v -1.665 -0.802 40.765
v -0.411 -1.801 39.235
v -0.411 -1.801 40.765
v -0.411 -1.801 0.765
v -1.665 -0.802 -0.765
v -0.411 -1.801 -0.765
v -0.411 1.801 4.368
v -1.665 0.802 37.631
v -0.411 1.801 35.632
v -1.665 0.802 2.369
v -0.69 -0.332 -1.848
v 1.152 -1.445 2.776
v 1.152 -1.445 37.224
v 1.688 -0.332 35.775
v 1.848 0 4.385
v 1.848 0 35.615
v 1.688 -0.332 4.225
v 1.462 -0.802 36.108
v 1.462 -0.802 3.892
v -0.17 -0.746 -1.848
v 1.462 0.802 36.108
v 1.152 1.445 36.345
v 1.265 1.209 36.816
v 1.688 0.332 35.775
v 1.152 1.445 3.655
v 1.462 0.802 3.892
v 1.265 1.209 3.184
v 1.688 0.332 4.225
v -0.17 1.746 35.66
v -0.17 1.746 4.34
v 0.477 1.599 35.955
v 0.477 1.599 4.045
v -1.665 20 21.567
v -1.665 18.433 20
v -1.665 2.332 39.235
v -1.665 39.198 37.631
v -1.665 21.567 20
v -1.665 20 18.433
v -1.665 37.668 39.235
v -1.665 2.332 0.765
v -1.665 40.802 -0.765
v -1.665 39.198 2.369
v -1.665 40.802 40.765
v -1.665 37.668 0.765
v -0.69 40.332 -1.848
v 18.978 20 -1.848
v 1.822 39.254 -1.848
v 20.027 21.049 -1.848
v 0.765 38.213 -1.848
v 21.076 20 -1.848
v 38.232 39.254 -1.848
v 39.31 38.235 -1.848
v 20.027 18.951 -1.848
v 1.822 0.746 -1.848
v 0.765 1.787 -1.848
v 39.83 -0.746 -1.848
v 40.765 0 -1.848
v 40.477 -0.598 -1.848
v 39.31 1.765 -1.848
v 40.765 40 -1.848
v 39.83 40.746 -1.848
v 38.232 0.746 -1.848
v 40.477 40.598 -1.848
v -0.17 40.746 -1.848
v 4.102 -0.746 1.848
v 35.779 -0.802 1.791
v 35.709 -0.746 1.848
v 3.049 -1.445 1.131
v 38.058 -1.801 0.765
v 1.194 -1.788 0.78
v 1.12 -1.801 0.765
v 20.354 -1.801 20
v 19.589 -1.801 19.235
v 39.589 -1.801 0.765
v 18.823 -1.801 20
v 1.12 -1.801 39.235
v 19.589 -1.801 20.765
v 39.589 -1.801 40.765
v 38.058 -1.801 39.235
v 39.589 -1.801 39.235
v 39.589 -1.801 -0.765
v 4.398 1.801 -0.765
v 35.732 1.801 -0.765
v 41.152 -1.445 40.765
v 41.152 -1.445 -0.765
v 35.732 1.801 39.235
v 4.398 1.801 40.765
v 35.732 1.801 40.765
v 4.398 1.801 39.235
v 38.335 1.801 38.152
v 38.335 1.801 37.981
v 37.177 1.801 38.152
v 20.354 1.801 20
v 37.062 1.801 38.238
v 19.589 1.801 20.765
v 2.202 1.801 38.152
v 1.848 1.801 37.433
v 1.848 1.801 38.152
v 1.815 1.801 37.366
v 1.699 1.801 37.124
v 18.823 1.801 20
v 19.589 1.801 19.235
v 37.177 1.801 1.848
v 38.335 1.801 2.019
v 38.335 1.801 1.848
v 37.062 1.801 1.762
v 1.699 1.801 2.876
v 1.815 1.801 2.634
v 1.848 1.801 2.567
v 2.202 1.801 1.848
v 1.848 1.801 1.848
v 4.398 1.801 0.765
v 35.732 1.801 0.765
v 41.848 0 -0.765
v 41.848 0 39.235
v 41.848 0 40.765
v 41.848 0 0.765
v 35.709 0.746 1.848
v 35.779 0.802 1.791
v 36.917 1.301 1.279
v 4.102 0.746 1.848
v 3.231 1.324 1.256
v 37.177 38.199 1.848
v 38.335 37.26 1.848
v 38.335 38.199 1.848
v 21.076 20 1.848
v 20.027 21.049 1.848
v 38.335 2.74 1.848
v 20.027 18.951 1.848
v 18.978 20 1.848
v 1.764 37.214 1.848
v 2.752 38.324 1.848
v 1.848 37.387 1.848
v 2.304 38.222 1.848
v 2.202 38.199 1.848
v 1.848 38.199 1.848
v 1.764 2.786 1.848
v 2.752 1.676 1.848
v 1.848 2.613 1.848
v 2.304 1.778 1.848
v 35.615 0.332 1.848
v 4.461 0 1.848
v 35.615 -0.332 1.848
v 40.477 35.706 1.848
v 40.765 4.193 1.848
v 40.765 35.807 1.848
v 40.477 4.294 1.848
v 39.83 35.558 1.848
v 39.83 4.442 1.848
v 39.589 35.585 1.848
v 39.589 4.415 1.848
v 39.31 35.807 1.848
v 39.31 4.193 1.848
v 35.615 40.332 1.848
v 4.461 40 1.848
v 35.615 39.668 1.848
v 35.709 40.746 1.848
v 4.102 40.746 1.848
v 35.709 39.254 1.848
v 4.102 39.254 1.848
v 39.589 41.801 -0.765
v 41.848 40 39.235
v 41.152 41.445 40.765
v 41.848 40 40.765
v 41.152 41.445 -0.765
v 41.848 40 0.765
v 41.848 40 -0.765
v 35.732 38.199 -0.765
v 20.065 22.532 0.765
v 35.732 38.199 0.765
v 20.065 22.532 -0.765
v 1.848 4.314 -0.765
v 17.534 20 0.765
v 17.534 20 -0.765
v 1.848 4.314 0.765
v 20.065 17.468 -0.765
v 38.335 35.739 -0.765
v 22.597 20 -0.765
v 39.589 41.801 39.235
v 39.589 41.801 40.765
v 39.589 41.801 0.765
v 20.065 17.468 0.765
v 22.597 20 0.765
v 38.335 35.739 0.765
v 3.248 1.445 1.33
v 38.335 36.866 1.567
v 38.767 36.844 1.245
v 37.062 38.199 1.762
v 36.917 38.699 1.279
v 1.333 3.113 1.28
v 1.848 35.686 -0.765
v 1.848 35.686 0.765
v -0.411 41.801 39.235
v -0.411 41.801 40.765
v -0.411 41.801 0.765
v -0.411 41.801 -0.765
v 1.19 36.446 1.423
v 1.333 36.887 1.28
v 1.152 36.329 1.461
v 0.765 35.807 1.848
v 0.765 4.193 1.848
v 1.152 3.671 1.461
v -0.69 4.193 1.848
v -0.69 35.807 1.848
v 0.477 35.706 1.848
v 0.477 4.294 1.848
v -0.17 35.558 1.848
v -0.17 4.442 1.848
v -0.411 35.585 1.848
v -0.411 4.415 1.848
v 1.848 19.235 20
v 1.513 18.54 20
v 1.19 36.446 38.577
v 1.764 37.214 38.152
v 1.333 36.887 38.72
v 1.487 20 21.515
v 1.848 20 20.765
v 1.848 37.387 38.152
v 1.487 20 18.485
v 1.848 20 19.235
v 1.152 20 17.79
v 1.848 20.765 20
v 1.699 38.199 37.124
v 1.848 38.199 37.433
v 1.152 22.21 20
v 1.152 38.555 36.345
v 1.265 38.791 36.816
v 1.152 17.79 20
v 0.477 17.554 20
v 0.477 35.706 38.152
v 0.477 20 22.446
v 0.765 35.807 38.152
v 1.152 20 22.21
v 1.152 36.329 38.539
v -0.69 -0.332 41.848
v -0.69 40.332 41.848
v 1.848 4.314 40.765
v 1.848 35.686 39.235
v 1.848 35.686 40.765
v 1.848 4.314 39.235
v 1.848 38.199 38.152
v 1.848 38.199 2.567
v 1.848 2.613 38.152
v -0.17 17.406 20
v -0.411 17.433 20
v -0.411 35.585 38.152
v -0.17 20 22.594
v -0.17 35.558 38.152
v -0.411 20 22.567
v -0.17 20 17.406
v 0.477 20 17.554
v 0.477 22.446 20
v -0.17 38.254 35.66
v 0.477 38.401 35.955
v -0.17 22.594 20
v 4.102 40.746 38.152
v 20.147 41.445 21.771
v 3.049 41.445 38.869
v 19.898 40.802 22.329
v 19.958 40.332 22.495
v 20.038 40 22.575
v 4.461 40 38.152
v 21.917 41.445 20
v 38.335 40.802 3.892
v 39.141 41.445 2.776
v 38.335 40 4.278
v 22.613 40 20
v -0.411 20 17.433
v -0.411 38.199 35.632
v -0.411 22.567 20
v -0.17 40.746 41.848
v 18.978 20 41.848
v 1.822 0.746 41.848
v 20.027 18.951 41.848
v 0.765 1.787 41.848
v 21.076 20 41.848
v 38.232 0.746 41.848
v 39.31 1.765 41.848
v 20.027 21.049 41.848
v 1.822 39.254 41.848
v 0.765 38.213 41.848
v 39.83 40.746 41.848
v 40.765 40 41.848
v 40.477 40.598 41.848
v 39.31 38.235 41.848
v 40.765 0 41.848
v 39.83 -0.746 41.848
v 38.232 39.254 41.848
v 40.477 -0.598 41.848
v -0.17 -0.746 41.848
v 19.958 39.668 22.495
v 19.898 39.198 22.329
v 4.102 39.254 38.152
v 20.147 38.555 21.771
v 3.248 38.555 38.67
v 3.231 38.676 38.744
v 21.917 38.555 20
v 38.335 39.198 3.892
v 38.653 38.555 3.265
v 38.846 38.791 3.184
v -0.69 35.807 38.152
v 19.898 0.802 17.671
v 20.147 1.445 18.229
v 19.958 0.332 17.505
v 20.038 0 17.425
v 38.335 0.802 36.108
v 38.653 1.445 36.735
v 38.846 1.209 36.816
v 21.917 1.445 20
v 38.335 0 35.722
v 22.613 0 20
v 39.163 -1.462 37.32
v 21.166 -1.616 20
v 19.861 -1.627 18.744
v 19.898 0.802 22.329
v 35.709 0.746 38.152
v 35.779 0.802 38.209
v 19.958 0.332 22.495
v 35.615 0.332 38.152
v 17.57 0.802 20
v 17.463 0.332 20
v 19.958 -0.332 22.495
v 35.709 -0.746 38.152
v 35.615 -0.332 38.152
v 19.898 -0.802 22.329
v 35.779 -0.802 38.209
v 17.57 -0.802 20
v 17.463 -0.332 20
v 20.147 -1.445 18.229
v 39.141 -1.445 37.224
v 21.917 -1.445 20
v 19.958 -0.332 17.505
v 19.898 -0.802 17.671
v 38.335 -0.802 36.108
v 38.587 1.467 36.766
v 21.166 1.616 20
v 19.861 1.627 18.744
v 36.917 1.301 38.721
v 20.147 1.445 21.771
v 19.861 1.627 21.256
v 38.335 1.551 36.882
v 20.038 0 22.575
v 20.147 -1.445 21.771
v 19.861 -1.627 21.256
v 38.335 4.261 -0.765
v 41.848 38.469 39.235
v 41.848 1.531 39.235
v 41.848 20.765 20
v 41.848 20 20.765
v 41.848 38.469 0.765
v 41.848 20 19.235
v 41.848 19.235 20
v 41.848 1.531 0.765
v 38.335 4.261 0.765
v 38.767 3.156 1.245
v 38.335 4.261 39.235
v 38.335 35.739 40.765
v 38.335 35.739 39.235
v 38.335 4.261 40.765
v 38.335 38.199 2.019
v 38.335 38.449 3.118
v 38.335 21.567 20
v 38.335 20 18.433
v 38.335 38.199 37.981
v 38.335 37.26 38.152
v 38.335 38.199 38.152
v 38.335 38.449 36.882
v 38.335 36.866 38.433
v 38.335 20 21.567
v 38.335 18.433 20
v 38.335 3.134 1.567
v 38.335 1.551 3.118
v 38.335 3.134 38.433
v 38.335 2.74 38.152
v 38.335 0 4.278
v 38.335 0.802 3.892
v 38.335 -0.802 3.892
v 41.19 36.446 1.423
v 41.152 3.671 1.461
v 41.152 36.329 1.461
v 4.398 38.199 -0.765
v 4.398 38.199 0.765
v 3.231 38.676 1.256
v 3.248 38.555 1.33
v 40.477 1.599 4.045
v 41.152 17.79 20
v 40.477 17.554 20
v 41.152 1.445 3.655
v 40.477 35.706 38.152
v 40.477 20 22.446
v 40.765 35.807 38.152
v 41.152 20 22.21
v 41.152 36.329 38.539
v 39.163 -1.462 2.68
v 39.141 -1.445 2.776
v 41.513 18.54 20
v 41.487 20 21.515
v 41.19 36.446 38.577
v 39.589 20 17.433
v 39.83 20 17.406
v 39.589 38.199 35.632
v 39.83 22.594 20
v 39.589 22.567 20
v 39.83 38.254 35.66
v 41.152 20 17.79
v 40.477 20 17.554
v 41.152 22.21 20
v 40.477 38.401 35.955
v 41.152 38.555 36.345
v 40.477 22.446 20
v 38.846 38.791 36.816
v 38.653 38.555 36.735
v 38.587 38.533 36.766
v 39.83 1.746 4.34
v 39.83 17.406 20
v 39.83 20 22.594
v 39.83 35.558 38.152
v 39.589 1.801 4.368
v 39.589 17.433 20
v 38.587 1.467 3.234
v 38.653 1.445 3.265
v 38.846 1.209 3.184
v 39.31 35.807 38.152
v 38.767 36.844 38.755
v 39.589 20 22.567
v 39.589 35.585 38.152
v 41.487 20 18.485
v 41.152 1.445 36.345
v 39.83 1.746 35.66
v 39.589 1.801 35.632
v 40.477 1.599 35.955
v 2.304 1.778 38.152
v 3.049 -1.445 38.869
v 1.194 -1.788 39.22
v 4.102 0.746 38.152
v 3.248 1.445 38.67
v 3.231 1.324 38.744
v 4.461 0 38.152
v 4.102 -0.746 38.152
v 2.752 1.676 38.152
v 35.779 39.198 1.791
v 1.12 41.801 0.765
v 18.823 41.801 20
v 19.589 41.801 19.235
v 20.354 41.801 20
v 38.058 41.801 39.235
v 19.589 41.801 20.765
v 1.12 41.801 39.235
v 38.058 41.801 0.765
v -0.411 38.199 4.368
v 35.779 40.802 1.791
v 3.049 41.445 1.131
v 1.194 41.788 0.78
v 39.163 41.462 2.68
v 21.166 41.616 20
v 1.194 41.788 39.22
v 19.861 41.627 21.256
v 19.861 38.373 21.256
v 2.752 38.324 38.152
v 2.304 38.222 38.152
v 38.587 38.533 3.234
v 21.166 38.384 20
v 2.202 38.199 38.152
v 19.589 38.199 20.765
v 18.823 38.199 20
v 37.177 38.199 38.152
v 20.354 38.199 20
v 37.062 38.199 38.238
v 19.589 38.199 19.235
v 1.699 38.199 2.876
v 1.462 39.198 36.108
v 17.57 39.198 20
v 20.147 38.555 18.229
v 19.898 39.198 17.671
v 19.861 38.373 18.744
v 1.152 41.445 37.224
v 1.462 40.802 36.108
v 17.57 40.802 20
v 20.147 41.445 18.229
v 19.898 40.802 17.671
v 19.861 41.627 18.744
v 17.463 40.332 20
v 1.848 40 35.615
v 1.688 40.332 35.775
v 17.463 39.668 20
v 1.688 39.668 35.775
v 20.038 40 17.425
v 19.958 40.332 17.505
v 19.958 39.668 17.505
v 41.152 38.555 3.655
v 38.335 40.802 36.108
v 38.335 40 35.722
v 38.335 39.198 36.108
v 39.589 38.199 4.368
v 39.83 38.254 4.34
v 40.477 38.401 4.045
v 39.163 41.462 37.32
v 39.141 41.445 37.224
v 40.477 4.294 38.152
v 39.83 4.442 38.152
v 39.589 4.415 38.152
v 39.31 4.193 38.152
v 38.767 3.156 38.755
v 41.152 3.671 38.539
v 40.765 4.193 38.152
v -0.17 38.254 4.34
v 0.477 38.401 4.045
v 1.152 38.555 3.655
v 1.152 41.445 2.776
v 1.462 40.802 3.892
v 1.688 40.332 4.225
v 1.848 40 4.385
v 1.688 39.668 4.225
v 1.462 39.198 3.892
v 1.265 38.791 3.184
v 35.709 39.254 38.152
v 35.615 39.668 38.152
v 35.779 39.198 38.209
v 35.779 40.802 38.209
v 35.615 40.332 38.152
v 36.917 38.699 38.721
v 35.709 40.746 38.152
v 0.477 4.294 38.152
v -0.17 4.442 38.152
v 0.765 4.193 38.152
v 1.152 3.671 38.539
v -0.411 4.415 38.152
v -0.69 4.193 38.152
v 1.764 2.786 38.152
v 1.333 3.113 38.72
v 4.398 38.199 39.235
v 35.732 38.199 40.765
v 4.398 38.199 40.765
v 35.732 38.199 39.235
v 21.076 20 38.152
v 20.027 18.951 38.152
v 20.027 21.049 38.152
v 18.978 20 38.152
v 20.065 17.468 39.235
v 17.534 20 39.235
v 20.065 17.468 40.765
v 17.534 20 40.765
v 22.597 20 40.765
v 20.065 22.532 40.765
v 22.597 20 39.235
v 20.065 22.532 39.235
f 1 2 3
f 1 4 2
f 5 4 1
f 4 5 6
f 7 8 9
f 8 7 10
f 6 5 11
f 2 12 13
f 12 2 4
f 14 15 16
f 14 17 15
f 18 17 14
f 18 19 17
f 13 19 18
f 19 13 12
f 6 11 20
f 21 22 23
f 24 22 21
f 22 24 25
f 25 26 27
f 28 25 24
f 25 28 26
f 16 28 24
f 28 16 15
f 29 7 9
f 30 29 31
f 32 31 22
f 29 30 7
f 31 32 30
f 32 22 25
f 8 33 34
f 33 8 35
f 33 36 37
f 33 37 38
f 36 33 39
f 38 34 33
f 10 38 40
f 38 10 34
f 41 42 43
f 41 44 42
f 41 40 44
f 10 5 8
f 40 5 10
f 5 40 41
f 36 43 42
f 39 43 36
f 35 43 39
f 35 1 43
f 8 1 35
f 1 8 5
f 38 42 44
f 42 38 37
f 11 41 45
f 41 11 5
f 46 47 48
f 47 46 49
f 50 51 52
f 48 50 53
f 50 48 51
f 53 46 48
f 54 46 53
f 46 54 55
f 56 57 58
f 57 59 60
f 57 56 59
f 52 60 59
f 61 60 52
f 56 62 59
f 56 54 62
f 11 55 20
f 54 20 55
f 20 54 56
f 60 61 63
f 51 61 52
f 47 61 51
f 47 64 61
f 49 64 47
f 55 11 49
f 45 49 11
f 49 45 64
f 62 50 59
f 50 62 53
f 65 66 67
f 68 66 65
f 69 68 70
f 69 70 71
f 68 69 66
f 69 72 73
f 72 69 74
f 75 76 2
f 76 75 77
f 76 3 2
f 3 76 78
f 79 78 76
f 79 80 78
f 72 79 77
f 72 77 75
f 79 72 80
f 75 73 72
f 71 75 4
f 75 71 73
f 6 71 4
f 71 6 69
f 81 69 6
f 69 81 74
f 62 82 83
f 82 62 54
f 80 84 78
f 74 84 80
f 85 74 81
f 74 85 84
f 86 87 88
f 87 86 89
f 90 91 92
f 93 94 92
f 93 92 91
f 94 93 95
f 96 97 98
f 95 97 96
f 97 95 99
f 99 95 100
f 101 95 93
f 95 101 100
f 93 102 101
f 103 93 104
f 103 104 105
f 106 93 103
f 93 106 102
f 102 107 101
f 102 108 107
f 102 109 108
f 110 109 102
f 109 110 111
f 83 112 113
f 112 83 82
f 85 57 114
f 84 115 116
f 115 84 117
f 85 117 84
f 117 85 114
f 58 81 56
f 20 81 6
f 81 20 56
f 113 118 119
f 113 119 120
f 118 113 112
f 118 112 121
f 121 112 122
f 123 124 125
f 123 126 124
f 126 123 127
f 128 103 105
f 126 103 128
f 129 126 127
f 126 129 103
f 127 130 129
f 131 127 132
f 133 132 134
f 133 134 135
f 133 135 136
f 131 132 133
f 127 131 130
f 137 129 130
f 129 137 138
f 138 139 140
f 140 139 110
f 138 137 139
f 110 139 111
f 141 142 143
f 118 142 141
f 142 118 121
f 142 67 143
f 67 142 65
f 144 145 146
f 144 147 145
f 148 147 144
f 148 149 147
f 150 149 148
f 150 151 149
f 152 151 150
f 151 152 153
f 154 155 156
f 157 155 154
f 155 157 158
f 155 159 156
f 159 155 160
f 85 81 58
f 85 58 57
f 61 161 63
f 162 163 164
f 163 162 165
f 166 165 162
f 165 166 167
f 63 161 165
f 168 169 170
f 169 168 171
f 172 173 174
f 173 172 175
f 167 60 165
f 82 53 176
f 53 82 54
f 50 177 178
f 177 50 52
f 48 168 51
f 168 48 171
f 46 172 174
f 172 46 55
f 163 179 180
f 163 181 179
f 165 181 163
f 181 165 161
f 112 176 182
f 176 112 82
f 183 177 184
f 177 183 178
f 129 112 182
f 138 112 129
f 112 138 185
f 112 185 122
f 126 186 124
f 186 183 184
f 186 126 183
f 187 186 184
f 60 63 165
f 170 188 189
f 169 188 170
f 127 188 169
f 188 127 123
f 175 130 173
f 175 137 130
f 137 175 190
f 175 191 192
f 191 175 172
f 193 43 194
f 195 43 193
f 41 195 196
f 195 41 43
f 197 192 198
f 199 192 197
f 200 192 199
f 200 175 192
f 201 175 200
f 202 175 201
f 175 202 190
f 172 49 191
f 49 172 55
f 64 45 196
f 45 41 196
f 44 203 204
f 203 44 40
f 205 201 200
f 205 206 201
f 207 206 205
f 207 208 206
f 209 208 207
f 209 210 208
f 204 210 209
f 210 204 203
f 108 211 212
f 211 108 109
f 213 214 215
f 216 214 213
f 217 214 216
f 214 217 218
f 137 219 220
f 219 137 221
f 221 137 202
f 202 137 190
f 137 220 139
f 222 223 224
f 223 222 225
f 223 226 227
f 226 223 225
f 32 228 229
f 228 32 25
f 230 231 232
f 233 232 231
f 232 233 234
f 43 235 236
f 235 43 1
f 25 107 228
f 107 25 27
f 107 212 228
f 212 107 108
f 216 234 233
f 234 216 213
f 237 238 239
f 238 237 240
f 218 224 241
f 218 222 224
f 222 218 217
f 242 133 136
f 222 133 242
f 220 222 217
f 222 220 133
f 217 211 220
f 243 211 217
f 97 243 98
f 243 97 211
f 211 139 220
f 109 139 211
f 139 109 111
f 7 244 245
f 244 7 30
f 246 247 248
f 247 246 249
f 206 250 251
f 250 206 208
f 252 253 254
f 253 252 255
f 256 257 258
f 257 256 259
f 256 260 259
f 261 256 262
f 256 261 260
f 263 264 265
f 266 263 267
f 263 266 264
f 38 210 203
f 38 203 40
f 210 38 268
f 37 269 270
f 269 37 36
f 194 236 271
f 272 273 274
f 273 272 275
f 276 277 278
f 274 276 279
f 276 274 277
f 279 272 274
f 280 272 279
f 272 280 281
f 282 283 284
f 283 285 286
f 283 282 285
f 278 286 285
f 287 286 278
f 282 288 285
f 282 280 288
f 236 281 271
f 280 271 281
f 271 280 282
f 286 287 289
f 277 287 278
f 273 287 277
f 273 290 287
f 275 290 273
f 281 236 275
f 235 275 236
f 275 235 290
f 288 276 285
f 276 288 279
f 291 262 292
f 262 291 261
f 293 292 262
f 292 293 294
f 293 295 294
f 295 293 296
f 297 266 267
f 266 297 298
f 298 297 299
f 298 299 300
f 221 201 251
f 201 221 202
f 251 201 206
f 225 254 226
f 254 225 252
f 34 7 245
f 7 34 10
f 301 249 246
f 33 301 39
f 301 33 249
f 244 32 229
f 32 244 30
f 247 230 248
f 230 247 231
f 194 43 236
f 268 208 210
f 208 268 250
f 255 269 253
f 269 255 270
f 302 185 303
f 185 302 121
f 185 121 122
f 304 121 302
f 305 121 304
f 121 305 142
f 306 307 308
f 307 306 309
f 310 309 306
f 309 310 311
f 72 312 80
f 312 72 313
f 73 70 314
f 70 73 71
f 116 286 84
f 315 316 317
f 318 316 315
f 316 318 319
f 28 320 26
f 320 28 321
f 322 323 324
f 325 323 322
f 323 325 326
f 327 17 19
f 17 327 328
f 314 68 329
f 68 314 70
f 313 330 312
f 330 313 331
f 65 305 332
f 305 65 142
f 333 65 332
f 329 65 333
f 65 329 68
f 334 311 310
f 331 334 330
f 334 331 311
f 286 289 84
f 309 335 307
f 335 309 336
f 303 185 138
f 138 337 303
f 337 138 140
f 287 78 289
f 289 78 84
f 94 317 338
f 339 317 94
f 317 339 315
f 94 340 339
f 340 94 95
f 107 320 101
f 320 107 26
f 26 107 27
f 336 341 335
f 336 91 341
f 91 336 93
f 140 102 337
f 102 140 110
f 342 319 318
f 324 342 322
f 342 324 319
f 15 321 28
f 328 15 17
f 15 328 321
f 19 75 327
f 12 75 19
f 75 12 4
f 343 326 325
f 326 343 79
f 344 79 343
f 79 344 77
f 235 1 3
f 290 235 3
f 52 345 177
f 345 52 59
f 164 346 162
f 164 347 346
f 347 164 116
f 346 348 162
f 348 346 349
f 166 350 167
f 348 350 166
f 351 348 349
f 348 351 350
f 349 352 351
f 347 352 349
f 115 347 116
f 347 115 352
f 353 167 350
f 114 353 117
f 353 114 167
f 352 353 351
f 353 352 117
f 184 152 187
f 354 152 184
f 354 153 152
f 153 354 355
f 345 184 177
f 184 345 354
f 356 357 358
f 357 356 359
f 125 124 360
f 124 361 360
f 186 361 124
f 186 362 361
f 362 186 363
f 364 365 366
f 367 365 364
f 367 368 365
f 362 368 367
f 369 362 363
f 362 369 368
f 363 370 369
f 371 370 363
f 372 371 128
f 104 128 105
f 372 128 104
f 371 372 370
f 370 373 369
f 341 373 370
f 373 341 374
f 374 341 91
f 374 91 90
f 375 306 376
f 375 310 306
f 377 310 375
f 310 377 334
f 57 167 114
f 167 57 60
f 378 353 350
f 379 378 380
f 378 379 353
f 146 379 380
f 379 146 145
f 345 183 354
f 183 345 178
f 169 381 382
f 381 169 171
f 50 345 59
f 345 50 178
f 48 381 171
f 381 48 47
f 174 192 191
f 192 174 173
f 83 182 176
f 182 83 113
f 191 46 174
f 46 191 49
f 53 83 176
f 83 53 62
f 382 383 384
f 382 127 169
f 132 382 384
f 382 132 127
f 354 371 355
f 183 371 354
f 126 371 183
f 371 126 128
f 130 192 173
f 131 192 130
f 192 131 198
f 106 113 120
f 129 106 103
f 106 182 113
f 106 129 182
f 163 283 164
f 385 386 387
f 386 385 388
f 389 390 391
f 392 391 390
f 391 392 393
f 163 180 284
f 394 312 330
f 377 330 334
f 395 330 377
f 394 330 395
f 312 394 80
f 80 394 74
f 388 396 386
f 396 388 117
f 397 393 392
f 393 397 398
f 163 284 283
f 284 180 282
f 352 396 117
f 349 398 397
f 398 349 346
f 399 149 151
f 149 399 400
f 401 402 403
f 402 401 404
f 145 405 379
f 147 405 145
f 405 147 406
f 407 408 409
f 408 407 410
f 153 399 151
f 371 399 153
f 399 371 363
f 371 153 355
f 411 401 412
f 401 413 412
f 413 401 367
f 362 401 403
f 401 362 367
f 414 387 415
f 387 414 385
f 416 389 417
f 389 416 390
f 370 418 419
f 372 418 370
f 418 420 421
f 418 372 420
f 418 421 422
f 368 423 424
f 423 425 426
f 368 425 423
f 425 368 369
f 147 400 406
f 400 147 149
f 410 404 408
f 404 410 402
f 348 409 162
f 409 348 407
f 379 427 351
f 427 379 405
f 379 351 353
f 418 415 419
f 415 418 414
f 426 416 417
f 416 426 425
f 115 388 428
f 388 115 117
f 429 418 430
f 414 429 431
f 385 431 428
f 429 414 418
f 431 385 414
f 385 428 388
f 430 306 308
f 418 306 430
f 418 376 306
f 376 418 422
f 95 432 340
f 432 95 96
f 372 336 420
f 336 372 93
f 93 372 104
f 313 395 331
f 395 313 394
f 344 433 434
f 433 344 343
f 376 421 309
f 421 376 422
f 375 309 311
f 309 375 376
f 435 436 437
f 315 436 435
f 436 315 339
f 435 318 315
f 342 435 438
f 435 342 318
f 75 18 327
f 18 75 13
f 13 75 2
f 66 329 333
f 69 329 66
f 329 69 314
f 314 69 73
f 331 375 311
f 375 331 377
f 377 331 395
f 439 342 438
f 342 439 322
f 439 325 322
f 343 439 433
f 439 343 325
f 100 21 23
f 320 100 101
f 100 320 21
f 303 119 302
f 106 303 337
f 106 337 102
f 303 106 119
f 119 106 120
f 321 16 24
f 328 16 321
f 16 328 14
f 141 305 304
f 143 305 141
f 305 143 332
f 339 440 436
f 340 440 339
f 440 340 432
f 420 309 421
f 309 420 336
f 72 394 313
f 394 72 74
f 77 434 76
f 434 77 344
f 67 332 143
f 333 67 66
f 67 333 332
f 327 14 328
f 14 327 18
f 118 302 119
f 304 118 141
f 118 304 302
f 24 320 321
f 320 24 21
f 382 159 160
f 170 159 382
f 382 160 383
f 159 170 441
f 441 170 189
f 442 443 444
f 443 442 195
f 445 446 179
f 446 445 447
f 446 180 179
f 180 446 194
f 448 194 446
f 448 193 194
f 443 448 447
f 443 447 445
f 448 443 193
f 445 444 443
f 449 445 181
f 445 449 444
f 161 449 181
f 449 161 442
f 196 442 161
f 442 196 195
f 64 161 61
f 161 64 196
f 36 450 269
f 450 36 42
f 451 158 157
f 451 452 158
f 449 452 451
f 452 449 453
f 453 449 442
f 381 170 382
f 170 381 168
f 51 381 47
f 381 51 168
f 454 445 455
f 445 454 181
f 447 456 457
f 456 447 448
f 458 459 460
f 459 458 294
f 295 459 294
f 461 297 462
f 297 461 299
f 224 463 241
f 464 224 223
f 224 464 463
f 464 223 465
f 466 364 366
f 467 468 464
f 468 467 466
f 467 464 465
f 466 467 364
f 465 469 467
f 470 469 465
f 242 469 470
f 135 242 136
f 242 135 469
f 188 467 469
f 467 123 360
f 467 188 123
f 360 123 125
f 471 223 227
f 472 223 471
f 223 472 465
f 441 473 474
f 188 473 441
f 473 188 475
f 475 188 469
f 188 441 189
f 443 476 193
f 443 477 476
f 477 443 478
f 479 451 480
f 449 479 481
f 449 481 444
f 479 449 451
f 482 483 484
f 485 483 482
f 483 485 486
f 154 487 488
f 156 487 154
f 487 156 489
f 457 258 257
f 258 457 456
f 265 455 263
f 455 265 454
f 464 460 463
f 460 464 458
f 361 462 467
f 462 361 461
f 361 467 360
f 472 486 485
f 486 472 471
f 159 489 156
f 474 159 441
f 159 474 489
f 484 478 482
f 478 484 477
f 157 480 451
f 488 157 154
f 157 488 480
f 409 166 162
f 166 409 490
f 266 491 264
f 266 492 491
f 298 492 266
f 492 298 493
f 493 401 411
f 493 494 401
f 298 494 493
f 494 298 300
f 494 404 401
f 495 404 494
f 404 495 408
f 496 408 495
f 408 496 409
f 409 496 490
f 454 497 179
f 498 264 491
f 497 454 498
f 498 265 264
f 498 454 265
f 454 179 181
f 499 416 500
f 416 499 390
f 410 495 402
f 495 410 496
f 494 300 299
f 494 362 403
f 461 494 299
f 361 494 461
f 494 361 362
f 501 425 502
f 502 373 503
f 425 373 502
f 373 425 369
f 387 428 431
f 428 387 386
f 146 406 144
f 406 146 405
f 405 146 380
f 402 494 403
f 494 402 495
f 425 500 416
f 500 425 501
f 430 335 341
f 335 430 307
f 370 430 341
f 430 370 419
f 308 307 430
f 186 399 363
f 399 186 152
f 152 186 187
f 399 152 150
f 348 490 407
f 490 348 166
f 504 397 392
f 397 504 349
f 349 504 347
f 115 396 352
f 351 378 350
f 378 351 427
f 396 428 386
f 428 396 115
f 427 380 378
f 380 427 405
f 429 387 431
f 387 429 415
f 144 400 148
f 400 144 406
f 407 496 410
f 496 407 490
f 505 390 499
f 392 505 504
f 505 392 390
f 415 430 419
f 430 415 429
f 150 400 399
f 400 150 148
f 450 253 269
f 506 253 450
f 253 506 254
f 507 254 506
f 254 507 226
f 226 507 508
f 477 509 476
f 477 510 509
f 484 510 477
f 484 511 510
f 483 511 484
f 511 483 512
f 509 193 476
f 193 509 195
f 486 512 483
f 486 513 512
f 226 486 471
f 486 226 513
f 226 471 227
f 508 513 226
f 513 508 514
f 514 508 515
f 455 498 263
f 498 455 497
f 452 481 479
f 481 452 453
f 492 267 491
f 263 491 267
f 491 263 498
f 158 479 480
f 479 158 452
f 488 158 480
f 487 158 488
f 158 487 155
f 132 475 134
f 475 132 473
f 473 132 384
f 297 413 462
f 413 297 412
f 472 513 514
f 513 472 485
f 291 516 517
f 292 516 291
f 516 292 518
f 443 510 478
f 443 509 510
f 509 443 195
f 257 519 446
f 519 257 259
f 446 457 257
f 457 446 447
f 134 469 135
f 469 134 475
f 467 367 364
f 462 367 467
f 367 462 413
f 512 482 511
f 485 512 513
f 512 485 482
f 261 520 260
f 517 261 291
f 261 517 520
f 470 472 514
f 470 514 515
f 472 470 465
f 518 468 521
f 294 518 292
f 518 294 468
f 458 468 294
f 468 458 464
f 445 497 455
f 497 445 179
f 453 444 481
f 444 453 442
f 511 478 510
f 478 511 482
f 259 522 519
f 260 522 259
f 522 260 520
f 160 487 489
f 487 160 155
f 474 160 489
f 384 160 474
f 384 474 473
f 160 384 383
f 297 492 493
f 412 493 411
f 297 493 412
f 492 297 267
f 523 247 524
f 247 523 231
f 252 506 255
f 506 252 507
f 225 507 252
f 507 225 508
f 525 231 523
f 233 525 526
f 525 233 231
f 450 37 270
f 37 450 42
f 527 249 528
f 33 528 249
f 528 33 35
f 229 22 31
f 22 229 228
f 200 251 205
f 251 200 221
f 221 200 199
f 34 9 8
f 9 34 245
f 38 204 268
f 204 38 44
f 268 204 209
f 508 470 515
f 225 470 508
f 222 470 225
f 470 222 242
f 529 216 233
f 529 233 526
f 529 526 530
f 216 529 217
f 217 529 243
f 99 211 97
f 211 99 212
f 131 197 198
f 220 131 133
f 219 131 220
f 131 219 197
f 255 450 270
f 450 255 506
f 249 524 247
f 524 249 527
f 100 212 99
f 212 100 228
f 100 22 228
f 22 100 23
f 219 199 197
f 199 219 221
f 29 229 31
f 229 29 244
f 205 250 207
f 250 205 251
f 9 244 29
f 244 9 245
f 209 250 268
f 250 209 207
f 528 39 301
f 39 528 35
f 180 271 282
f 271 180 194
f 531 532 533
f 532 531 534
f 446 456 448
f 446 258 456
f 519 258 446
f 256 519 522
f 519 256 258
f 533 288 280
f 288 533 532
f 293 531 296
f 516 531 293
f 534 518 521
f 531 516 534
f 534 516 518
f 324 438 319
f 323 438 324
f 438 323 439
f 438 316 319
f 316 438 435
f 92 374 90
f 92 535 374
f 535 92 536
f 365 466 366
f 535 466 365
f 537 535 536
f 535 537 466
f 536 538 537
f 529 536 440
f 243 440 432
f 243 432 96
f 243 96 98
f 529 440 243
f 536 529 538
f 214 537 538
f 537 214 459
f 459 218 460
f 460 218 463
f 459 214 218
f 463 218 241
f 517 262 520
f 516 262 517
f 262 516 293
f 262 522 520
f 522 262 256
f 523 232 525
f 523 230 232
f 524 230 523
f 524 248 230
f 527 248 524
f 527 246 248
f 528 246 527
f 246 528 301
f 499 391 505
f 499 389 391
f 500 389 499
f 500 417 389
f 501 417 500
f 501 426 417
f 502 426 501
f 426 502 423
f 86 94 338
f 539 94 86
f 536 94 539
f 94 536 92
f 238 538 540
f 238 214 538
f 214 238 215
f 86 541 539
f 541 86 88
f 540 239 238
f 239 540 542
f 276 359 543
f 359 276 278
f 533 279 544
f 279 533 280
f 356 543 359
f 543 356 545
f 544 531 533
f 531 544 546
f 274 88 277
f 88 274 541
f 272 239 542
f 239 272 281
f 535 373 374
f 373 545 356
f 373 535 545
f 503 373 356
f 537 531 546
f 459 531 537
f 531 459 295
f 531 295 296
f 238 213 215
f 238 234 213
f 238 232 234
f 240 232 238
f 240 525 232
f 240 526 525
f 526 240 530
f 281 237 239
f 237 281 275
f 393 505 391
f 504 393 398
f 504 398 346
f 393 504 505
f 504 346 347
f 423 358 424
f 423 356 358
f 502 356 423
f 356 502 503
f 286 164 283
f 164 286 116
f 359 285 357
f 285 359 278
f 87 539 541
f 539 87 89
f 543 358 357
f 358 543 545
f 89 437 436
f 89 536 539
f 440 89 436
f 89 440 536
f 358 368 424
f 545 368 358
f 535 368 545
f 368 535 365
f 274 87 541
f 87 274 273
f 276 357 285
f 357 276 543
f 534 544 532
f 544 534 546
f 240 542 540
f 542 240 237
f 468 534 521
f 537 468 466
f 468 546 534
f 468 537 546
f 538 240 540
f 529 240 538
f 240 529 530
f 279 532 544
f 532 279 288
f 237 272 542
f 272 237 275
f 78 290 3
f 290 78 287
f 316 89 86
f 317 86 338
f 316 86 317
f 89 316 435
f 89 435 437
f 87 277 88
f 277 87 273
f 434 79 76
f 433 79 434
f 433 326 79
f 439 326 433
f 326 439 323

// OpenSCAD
box = [[0,0,0],[1,0,0],[1,1,0],[0,1,0]
	,[0,1,1],[1,1,1],[1,0,1],[0,0,1]
	//,[1.3535,.5,.5],[.5,1.3535,.5],[.5,.5,1.3535]
	//,[-.3535,.5,.5],[.5,-.3535,.5],[.5,.5,-.3535]
];

octa = 0.5*[
	[0,0,-1.414],[1,1,0],[1,-1,0],
	[-1,-1,0],[-1,1,0],[0,0,1.414]

];

points = box;
lim = 1.5;

for (i=points, j=points){
	if(norm(i-j)<lim){
		echo(norm(i-j))
		
	hull()
	{
		translate(40*i) sphere(2);
	
		translate(40*j) sphere(2);
	}
	}
}
